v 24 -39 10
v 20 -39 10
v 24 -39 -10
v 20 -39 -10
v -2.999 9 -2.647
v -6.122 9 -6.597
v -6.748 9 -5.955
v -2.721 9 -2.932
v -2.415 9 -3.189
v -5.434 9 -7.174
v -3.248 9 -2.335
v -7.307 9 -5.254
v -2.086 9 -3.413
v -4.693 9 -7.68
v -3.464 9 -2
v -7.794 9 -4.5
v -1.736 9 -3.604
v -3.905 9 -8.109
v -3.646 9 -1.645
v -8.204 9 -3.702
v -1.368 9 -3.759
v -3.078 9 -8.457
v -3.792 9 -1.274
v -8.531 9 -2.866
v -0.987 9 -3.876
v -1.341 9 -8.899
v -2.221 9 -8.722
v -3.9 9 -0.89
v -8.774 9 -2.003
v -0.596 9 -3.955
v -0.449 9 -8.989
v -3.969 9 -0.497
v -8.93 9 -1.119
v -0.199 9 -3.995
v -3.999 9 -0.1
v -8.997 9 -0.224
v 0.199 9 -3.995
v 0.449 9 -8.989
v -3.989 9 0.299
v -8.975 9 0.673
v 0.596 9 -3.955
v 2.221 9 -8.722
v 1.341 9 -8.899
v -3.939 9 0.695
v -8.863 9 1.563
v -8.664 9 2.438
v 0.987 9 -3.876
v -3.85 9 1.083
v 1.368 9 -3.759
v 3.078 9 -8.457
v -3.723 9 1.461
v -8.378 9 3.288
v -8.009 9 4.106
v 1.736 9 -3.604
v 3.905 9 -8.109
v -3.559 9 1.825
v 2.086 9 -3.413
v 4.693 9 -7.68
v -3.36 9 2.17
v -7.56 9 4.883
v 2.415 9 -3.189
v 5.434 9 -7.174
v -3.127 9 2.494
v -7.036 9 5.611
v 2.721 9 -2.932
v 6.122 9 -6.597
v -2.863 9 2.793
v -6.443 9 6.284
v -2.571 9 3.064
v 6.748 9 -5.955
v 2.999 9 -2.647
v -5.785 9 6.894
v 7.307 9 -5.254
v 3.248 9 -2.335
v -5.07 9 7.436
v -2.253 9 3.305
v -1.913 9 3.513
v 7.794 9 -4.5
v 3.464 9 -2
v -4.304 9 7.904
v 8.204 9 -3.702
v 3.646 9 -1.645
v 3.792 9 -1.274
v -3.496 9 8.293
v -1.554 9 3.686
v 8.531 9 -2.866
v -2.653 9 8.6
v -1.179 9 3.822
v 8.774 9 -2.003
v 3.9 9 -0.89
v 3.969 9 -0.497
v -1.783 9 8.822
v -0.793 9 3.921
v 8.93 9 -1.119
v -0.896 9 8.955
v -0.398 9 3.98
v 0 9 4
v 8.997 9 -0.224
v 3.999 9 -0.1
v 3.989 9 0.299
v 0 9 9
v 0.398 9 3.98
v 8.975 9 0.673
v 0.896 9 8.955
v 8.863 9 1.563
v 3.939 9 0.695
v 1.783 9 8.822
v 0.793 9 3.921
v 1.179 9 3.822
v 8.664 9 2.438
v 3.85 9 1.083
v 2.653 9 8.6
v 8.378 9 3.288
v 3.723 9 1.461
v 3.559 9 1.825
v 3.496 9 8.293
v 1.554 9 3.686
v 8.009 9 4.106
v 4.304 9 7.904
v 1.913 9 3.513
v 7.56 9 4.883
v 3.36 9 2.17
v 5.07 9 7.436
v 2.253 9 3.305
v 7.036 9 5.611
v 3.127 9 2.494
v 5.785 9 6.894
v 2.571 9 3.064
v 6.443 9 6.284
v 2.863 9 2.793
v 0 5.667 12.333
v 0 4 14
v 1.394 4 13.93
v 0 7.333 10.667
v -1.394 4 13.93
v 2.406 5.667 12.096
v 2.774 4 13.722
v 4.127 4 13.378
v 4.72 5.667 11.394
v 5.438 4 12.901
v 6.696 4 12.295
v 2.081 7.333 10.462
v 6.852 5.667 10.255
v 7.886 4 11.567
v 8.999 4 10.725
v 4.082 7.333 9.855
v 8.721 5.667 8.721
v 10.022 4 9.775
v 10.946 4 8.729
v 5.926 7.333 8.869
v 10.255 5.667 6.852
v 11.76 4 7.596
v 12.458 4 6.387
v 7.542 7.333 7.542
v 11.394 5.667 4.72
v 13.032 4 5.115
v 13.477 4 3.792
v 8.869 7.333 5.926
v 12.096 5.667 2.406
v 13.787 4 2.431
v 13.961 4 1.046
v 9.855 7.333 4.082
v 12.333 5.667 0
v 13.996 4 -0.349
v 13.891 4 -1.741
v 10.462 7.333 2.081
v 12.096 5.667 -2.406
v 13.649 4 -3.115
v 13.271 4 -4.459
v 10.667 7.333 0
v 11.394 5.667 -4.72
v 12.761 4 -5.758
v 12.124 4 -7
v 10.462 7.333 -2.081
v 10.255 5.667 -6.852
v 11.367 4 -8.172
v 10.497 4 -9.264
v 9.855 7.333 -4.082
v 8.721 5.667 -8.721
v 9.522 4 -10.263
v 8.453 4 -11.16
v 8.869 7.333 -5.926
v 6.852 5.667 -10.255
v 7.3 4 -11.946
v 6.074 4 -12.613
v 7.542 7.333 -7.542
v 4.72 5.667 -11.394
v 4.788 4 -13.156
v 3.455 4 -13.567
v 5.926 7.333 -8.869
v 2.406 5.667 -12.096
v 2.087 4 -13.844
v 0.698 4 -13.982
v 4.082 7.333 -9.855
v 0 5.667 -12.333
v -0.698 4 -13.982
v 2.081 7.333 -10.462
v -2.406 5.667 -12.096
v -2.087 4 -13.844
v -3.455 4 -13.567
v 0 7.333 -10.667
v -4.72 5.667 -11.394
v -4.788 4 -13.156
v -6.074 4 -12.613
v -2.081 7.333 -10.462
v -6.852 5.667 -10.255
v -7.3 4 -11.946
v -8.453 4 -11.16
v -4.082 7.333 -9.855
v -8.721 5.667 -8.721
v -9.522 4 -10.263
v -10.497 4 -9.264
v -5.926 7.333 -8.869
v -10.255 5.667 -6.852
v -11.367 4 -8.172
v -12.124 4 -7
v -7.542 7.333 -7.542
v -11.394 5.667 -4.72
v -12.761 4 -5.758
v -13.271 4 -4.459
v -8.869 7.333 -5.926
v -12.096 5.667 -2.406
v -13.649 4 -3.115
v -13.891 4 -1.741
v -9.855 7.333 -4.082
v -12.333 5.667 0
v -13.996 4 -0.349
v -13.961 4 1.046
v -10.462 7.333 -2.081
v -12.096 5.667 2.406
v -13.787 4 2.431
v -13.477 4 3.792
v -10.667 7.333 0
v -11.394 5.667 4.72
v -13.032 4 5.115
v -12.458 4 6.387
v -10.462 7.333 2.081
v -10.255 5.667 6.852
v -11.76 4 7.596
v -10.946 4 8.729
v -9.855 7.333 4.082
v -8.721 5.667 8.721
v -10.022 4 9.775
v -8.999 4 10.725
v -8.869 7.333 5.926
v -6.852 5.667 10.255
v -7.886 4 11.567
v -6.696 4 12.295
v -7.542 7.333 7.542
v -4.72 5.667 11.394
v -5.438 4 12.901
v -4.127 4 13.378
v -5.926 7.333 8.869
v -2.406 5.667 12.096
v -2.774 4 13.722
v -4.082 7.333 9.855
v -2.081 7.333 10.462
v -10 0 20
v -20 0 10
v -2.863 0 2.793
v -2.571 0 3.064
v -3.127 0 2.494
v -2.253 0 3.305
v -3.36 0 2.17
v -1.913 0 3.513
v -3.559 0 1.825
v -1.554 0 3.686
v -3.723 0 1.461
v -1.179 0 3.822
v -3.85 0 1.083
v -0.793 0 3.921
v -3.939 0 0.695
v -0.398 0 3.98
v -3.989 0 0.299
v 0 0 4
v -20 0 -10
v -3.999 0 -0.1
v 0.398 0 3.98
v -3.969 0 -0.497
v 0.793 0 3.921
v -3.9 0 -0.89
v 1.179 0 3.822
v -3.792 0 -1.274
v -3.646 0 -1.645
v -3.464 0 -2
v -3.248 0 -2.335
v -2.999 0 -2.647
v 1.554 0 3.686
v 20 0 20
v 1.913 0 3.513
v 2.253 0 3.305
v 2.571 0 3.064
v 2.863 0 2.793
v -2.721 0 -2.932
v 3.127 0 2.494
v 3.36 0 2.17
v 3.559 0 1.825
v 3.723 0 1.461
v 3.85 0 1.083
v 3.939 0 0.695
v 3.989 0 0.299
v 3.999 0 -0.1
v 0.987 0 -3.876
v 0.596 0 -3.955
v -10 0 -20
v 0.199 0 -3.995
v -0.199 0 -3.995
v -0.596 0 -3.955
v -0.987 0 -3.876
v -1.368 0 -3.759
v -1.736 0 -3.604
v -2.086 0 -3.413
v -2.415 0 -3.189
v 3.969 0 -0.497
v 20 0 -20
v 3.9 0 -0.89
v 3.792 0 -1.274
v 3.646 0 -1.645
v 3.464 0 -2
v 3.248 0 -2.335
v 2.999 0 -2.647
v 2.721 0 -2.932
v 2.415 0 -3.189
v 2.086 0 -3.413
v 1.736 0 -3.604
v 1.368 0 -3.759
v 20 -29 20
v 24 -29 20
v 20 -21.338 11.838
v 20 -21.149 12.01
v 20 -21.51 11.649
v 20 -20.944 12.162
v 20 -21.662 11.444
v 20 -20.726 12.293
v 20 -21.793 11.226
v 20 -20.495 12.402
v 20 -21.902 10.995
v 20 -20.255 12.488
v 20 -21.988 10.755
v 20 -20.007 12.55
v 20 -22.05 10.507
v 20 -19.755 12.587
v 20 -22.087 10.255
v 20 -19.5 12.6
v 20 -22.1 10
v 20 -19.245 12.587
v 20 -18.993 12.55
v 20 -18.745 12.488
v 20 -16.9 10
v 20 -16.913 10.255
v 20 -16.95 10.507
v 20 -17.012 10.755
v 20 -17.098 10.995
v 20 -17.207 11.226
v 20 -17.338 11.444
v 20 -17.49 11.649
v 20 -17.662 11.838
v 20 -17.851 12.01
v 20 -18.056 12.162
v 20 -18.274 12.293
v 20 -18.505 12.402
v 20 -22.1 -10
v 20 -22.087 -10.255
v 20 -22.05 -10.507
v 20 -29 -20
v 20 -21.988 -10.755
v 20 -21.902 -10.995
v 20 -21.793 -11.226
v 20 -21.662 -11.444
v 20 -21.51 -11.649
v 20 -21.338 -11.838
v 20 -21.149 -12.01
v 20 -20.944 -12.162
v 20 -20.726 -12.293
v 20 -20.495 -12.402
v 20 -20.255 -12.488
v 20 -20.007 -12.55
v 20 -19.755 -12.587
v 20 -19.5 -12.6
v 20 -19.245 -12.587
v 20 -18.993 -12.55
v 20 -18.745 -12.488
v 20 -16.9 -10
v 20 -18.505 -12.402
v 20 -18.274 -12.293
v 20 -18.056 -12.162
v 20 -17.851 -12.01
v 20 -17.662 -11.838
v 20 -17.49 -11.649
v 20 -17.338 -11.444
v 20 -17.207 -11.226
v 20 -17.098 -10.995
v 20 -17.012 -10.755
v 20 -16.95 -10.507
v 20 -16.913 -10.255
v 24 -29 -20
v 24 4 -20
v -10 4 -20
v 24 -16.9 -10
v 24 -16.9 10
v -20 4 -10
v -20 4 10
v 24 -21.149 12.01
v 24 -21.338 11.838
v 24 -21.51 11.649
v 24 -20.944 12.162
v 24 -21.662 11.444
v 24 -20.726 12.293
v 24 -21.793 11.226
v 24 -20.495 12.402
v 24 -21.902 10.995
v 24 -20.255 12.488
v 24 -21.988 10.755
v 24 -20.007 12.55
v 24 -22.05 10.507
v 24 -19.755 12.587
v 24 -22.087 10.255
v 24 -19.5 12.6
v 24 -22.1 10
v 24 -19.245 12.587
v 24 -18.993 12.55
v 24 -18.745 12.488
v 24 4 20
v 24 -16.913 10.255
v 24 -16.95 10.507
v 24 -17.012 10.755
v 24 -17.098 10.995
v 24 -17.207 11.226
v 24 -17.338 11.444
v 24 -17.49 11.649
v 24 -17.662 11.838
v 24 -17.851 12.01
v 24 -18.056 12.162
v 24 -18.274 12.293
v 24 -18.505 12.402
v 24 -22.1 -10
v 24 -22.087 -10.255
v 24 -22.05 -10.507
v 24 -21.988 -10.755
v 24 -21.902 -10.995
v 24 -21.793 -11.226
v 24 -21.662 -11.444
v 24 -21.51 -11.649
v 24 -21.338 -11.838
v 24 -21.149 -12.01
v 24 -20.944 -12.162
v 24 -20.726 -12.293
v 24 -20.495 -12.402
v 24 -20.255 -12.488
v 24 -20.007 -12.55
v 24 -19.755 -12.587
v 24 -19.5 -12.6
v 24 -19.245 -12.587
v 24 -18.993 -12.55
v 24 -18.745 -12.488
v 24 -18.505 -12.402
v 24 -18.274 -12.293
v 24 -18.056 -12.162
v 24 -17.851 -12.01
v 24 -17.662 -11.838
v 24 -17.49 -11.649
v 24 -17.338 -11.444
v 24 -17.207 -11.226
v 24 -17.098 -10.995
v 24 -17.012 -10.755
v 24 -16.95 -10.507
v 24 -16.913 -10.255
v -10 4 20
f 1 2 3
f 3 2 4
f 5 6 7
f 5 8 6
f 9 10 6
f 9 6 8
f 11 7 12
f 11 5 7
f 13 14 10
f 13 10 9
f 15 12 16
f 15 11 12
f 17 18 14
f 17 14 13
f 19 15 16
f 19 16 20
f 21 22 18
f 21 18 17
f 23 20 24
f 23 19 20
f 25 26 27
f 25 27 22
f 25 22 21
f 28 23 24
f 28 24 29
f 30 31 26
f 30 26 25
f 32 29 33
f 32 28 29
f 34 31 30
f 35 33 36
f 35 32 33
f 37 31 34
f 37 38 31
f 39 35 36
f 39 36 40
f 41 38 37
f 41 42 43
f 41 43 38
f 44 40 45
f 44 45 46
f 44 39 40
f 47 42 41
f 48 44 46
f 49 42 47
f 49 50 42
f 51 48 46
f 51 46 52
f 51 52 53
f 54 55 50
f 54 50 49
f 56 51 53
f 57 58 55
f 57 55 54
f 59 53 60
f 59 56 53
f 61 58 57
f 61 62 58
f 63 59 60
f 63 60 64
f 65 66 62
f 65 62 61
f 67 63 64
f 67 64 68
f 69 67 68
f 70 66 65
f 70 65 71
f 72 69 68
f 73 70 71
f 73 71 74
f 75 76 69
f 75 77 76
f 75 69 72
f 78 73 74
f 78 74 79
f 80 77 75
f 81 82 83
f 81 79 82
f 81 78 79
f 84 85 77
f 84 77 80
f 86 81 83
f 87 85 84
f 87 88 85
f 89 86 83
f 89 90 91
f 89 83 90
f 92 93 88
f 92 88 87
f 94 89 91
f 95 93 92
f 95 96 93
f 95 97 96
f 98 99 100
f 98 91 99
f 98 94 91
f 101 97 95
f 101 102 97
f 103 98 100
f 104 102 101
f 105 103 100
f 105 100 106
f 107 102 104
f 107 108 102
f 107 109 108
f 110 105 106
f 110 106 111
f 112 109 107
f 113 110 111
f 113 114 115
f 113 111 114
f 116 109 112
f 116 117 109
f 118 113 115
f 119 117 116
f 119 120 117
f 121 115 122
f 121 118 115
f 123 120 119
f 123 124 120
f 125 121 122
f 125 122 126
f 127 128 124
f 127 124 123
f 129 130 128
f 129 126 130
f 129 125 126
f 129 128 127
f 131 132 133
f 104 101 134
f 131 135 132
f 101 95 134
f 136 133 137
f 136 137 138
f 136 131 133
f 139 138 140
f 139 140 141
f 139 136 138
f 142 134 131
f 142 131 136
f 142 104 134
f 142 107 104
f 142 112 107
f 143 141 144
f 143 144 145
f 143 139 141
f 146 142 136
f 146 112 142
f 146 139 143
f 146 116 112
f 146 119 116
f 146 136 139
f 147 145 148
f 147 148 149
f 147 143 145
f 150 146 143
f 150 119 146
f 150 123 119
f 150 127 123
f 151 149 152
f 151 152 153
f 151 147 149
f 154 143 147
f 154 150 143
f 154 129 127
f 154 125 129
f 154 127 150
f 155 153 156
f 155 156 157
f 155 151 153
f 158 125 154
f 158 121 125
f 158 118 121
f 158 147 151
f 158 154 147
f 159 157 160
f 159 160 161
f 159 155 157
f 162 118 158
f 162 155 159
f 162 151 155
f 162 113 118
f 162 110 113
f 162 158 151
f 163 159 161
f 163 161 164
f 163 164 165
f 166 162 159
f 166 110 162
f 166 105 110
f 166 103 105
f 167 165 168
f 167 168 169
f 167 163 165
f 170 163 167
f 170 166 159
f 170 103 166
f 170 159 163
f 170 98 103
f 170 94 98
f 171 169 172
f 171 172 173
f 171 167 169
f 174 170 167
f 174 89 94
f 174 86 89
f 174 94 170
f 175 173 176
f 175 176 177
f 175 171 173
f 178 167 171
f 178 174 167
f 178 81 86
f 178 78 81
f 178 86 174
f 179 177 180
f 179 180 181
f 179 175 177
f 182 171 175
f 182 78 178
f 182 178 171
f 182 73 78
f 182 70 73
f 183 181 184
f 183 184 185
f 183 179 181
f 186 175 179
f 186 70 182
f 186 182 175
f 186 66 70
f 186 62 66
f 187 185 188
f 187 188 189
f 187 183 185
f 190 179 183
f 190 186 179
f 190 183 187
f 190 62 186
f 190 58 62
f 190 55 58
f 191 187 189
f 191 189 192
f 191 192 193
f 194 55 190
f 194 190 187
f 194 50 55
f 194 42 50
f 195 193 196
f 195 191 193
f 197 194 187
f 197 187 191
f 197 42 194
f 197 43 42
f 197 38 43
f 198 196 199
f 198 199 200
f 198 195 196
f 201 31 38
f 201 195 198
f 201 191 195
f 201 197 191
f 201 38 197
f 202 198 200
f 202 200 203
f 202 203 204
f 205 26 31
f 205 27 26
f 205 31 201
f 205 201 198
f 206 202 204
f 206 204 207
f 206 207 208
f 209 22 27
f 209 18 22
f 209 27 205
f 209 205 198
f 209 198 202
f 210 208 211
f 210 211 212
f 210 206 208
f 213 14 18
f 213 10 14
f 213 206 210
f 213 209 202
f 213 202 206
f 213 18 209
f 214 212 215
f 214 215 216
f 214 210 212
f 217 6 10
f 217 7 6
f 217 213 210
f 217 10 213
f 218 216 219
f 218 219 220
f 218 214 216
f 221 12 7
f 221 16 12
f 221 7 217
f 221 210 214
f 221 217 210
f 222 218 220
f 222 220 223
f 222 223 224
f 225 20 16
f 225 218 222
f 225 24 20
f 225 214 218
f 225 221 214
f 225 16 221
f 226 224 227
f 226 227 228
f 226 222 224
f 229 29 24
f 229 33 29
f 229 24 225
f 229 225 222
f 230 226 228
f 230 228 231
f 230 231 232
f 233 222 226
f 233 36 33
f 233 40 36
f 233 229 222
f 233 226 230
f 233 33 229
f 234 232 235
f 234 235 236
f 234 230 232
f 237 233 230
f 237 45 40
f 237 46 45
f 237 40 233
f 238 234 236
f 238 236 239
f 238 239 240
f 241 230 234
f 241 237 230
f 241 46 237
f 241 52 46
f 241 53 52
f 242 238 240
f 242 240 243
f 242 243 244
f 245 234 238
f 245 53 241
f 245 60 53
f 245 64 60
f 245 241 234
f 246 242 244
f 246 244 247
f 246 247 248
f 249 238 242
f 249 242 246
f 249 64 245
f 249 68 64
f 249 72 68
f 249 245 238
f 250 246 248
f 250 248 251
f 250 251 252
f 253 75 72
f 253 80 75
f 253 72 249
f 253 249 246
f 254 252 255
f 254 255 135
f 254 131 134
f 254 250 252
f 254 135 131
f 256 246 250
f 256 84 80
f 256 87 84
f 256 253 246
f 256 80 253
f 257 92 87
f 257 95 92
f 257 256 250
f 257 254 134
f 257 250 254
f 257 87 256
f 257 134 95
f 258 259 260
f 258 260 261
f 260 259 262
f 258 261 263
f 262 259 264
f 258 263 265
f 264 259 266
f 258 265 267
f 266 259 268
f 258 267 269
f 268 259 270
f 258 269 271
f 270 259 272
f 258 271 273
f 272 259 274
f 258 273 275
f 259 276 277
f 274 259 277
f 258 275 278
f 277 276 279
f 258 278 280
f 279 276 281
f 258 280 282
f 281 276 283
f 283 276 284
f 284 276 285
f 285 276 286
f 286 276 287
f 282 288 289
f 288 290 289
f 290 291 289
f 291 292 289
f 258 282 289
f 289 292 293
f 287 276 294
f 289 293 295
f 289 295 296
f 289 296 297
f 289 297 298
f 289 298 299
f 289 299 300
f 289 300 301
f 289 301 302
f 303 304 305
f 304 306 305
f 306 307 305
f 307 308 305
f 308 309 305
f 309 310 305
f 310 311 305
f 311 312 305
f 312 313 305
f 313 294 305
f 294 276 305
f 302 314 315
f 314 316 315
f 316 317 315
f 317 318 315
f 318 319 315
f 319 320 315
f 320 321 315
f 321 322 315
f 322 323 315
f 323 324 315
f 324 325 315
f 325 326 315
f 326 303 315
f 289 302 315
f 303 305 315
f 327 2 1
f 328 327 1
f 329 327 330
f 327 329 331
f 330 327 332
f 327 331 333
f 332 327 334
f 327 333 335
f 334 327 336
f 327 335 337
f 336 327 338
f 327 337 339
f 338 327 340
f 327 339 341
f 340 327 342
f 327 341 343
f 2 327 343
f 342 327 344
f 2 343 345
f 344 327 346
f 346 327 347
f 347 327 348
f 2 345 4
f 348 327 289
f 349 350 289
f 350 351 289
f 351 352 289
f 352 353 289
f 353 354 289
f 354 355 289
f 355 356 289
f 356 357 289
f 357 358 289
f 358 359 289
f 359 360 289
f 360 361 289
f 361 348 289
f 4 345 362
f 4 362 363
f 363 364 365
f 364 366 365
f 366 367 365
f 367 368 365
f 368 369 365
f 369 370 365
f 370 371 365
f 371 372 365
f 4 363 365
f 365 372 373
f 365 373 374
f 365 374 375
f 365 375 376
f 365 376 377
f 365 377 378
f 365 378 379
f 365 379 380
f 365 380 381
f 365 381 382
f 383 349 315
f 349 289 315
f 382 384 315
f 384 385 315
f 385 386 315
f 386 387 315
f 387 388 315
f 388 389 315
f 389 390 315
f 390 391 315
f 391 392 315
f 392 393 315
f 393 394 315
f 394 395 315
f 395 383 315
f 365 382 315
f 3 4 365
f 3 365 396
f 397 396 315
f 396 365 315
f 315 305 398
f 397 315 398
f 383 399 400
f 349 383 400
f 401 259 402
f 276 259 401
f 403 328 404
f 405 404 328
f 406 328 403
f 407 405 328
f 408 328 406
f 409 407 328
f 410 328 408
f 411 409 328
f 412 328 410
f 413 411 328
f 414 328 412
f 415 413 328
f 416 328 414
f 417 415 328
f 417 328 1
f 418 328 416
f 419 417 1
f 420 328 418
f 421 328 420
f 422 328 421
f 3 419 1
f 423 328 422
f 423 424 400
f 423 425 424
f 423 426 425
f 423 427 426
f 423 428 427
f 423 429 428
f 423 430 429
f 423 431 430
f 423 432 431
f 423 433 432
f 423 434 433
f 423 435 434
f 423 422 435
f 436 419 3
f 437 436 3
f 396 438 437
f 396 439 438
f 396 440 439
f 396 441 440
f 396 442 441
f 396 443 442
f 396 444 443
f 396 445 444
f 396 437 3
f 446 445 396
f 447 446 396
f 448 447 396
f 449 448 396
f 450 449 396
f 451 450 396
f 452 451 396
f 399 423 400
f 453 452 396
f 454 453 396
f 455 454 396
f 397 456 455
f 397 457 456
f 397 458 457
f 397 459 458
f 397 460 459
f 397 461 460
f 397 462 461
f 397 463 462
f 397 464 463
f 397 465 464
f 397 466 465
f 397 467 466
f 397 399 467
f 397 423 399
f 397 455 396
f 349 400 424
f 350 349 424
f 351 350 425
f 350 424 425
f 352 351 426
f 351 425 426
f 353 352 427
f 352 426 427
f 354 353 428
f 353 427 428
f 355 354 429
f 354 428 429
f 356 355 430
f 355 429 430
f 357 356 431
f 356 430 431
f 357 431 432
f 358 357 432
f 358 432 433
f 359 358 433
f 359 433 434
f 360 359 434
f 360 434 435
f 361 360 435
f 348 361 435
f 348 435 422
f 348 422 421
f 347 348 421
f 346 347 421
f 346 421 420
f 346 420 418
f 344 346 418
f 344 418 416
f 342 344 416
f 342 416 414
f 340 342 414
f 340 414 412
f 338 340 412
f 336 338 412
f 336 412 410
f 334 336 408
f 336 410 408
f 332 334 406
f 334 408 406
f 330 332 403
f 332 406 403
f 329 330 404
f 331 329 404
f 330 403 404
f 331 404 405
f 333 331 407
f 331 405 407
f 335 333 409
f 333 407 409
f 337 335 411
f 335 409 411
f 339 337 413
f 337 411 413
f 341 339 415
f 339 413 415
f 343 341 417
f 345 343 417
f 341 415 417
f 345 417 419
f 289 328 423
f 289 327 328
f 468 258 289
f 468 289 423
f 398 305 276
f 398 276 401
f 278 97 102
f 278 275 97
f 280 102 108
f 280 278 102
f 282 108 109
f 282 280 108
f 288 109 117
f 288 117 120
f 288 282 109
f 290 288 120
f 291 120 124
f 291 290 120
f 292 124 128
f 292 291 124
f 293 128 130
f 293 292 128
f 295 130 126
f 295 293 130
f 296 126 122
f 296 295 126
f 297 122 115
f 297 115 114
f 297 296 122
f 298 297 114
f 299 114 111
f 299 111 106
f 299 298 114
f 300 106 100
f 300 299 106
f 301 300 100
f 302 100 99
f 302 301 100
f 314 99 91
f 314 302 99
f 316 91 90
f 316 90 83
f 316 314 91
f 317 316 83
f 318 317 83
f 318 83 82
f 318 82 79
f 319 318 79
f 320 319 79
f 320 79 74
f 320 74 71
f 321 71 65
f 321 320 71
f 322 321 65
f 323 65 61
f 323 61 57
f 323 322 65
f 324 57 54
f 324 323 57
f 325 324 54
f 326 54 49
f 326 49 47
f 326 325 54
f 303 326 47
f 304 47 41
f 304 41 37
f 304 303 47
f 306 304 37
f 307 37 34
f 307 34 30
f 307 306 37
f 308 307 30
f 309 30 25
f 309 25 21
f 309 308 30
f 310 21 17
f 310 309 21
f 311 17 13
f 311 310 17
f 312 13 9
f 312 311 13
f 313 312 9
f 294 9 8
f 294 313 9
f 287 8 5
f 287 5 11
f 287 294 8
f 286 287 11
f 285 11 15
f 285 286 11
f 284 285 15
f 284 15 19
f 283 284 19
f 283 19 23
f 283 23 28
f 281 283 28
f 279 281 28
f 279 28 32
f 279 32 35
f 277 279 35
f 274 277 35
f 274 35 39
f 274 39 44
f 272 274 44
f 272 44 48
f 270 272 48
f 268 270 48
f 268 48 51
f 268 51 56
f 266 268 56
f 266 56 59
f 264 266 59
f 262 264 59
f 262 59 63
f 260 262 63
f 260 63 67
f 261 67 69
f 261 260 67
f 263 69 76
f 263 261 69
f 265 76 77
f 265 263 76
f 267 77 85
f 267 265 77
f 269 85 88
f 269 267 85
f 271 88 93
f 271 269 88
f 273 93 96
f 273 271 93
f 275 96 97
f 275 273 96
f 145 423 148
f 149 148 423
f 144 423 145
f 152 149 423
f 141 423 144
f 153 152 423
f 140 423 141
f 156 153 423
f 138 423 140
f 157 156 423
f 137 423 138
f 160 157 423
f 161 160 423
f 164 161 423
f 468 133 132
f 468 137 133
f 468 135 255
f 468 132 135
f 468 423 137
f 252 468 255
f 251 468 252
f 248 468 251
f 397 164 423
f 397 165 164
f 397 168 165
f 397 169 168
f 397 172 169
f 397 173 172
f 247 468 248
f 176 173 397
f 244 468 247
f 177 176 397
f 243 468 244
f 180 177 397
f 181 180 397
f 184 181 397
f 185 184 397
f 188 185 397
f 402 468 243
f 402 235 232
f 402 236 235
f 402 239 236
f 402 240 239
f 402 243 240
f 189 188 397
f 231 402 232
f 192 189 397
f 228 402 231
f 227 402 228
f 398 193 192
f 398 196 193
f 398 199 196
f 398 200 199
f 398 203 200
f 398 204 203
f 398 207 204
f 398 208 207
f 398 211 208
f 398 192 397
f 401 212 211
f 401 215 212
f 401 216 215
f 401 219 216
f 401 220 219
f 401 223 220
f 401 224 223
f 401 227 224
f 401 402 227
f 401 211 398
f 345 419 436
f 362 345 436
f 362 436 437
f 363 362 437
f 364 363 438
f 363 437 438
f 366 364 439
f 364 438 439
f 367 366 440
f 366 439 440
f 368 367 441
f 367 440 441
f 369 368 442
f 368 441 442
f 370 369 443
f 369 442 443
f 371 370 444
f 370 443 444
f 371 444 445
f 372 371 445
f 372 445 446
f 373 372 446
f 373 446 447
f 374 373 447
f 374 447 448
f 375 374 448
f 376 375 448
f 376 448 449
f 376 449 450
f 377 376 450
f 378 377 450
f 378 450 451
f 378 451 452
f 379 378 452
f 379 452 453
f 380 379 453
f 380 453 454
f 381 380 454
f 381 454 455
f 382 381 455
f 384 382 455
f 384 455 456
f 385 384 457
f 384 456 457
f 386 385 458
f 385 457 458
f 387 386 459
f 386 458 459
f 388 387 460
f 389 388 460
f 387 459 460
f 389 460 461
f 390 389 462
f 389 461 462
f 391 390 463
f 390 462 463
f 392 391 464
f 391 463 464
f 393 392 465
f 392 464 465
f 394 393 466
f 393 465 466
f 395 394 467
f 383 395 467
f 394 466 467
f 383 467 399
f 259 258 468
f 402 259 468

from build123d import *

# Parameters (mm, degrees)
SKETCH1_W               = 40
SKETCH1_H               = 40
SKETCH1_R               = 4
BOSS_EXTRUDE1_DEPTH     = 4
SKETCH2_R               = 9
SKETCH2_R_2             = 4
BOSS_EXTRUDE2_DEPTH     = 5
SKETCH3_W               = 40
SKETCH3_H               = 43
BOSS_EXTRUDE3_DEPTH     = 4
CUT_EXTRUDE1_DEPTH      = 60.338014797
CUT_EXTRUDE1_DEPTH_BACK = 60.338014797
CHAMFER2_SIZE           = 5
CHAMFER3_SIZE           = 10


with BuildPart() as part:
    # Sketch1 → Boss-Extrude1 (new body)
    with BuildSketch(Plane(origin=(0, 0, 0), x_dir=(1, 0, 0), z_dir=(0, 1, 0))):
        Rectangle(SKETCH1_W, SKETCH1_H)
        with Locations(Location((0, 0, 0), (0, 0, 270))):
            Circle(SKETCH1_R, mode=Mode.SUBTRACT)
    extrude(amount=BOSS_EXTRUDE1_DEPTH)

    # Sketch2 → Boss-Extrude2 (add)
    with BuildSketch(Plane(origin=(0, 4, 0), x_dir=(1, 0, 0), z_dir=(0, 1, 0))):
        with Locations(Location((0, 0, 0), (0, 0, 270))):
            Circle(SKETCH2_R)
        with Locations(Location((0, 0, 0), (0, 0, 270))):
            Circle(SKETCH2_R_2, mode=Mode.SUBTRACT)
    extrude(amount=BOSS_EXTRUDE2_DEPTH)

    # Sketch3 → Boss-Extrude3 (add)
    with BuildSketch(Plane(origin=(20, 0, 0), x_dir=(0, 0, -1), z_dir=(1, 0, 0))):
        with Locations((0, -17.5)):
            Rectangle(SKETCH3_W, SKETCH3_H)
    extrude(amount=BOSS_EXTRUDE3_DEPTH)

    # Sketch4 → Cut-Extrude1 (cut, two sides: drawn at the far end of the back side and taken through both)
    with BuildSketch(Plane.ZY.offset(-20).offset(-CUT_EXTRUDE1_DEPTH_BACK)):
        with BuildLine():
            Line((-10, -16.9), (10, -16.9))
            ThreePointArc((10, -16.9), (12.6, -19.5), (10, -22.1))
            Line((10, -22.1), (-10, -22.1))
            ThreePointArc((-10, -22.1), (-12.6, -19.5), (-10, -16.9))
        make_face()
    extrude(amount=CUT_EXTRUDE1_DEPTH + CUT_EXTRUDE1_DEPTH_BACK, mode=Mode.SUBTRACT)

    # Chamfer2
    chamfer2_edges = [part.edges().sort_by_distance(p)[0] for p in [
        (0, 4, -9),
    ]]
    chamfer(chamfer2_edges, length=CHAMFER2_SIZE - 0.0001)  # a hair under: the kernel refuses the full size

    # Chamfer3
    chamfer3_edges = [part.edges().sort_by_distance(p)[0] for p in [
        (22, -39, 20),
        (22, -39, -20),
        (-20, 2, 20),
        (-20, 2, -20),
    ]]
    chamfer(chamfer3_edges, length=CHAMFER3_SIZE)


solid = part.part
